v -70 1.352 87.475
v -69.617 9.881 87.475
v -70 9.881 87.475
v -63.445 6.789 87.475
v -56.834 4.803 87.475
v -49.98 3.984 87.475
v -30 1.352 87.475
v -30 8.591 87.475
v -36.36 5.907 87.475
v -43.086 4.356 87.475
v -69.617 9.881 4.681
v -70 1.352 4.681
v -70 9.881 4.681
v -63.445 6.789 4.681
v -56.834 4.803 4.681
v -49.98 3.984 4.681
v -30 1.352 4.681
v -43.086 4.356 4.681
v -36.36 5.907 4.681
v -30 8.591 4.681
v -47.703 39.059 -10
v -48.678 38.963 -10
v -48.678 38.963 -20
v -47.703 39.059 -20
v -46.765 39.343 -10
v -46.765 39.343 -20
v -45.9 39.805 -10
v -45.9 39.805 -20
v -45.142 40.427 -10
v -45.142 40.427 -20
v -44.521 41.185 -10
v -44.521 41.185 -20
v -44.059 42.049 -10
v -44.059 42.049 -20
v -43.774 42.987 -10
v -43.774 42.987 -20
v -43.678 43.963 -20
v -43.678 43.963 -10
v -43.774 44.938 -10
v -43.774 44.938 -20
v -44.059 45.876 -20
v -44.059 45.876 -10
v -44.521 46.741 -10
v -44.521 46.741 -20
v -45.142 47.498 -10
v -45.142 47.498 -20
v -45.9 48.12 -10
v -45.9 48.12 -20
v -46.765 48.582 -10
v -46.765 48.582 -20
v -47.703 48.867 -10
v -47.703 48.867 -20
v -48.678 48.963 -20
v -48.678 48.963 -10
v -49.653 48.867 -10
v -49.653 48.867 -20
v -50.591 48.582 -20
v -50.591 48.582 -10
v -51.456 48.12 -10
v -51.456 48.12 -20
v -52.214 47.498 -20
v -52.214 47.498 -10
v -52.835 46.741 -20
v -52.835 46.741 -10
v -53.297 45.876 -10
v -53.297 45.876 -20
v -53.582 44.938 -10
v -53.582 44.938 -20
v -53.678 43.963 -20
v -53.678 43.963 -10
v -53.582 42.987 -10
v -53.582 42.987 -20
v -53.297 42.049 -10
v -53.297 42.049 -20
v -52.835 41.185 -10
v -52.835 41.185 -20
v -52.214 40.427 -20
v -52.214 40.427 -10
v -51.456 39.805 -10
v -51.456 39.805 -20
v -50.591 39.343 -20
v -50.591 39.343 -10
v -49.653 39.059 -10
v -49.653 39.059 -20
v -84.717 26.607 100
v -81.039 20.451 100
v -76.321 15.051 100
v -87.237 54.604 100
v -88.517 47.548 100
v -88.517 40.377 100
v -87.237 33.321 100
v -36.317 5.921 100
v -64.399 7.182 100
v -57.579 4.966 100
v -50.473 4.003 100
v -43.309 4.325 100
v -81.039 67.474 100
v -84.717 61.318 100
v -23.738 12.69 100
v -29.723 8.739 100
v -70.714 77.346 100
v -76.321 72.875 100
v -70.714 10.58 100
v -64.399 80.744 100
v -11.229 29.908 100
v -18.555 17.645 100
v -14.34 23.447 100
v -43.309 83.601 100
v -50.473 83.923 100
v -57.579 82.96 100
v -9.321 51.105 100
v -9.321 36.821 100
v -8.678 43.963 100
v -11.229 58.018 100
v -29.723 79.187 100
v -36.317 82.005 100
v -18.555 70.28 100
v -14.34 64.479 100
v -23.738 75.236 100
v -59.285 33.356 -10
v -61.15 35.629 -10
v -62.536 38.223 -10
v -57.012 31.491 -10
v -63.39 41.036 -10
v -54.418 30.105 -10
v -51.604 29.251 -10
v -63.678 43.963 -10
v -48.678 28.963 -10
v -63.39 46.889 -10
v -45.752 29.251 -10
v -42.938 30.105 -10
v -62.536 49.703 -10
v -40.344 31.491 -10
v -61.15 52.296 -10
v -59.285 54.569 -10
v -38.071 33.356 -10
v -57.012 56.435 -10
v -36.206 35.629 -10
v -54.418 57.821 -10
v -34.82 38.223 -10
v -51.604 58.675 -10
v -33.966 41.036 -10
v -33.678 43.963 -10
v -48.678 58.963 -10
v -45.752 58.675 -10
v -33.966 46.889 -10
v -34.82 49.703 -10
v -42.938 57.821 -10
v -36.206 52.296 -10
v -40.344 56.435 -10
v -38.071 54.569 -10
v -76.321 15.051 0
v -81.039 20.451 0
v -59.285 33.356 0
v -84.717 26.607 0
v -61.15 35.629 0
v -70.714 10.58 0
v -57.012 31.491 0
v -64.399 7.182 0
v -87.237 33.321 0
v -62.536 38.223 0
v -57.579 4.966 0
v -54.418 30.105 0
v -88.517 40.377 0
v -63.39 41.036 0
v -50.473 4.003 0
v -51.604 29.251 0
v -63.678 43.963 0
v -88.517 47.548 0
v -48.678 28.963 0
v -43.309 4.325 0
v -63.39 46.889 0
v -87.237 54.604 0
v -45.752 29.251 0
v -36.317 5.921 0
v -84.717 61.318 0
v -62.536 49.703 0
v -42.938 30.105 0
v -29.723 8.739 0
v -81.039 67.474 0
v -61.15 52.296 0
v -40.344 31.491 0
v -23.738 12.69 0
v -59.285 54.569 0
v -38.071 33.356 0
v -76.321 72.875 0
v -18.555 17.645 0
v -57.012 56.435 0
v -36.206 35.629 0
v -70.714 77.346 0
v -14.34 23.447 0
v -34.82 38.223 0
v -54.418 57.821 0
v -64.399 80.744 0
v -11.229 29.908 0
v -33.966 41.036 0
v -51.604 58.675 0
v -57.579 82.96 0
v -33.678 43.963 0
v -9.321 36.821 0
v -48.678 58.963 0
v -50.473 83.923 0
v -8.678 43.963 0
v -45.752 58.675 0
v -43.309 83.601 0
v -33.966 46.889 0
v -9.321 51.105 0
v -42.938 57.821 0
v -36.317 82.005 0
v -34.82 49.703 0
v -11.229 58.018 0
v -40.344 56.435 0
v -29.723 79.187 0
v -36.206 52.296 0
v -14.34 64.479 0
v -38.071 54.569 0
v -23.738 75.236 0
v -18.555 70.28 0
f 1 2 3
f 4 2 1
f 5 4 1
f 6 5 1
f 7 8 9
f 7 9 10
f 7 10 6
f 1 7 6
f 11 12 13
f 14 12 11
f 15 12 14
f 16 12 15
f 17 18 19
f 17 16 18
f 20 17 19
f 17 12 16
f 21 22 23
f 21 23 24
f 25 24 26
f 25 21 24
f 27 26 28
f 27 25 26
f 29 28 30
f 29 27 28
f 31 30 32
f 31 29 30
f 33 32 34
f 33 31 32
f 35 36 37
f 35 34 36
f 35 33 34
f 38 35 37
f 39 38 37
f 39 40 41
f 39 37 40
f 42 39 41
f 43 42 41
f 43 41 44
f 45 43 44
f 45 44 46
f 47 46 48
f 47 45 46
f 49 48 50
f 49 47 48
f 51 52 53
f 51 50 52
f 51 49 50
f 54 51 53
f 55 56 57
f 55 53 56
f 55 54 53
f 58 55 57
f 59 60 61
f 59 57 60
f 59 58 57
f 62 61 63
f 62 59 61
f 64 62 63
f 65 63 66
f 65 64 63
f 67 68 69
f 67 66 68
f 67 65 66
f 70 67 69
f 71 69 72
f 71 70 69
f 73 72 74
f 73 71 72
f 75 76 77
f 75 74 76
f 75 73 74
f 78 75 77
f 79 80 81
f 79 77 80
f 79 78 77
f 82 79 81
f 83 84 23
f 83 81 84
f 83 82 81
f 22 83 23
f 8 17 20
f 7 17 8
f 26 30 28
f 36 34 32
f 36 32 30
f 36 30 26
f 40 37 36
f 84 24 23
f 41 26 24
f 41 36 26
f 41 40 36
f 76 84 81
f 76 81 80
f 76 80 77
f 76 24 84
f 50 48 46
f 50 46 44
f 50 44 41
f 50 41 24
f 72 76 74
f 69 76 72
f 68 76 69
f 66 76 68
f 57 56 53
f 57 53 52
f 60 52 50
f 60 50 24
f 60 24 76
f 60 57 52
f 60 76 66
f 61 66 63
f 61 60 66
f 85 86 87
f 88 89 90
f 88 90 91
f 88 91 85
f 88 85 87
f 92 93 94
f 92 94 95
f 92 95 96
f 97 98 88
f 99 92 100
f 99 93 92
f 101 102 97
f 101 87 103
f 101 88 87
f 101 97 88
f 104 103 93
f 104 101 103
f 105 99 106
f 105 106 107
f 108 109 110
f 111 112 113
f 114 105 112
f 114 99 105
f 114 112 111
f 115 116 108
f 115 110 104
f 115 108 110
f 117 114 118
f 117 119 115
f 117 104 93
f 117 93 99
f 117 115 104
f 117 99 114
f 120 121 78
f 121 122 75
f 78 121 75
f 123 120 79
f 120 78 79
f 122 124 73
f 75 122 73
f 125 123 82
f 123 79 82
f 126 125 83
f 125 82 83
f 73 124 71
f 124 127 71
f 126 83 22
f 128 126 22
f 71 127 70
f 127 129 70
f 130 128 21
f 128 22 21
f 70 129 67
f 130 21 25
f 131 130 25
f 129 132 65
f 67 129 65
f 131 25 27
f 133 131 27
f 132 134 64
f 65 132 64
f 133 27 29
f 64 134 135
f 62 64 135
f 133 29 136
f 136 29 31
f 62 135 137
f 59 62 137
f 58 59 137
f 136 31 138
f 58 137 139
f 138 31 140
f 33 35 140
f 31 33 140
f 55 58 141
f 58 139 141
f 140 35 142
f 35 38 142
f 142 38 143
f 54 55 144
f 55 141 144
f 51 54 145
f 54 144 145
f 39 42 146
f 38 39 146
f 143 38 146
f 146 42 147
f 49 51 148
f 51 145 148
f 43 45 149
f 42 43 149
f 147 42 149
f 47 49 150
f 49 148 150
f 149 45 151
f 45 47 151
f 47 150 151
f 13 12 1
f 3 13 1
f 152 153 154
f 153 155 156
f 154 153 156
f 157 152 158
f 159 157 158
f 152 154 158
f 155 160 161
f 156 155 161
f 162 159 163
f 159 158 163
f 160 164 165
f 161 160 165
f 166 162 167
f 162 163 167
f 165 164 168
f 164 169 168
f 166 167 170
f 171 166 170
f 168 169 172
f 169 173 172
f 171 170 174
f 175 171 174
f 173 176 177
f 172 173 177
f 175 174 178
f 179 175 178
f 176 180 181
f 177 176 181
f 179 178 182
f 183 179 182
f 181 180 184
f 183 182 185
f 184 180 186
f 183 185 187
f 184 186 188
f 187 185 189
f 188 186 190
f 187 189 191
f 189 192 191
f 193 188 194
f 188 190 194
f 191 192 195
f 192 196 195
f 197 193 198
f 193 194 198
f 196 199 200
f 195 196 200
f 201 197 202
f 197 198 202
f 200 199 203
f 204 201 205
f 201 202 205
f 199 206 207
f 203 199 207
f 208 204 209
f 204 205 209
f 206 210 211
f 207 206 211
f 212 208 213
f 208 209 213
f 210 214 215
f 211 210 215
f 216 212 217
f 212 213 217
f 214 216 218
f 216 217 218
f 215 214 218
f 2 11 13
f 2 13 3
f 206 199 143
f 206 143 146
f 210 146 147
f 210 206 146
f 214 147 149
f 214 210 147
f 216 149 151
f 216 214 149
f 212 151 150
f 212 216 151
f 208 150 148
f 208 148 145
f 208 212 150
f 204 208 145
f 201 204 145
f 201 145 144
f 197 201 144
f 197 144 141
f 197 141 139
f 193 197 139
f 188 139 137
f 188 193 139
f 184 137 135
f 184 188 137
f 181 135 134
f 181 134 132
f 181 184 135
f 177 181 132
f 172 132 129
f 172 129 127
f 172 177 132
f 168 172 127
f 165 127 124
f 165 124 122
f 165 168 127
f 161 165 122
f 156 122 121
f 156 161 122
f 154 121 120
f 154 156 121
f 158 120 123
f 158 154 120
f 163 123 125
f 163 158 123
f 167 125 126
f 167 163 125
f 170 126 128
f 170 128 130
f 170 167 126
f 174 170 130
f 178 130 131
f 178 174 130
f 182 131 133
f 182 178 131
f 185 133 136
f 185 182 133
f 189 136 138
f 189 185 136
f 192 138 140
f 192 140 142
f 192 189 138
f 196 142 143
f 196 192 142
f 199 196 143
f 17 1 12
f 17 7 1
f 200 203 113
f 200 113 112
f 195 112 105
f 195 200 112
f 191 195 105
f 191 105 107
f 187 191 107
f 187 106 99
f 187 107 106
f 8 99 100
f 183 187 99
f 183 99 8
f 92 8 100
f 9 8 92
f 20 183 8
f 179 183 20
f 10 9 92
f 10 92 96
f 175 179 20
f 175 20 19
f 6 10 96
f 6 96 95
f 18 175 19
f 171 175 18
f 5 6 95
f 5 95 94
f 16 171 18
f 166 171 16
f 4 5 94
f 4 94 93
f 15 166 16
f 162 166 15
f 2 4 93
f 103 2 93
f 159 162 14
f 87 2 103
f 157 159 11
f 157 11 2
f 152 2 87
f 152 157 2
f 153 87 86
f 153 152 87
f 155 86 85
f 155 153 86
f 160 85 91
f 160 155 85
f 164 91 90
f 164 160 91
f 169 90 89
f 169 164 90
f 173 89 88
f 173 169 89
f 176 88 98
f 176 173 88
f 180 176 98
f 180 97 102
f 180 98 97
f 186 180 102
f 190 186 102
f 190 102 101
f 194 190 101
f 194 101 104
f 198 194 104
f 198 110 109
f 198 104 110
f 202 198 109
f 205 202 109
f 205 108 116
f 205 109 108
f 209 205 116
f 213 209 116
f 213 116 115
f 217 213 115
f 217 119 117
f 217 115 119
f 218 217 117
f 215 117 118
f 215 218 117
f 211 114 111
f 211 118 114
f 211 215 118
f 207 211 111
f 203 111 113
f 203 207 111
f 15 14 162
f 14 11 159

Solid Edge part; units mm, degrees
sketch "Sketch1" plane through (0, 0, 0) normal (0, 0, 1) x (1, 0, 0)
  circle A0 centre (-48.678, 43.9628) radius 40
extrude "Protrusion1" add sketch "Sketch1" along normal blind 100
sketch "Sketch2" plane through (0, 0, 0) normal (0, 0, 1) x (1, 0, 0)
  circle A0 centre (-48.678, 43.9628) radius 15
extrude "ExtrudedProtrusion_3" add sketch "Sketch2" against normal blind 10
sketch "Sketch3" plane through (-48.678, 43.9628, -10) normal (0, 0, -1) x (0, -1, 0)
  circle A0 centre (0, 0) radius 5
extrude "ExtrudedProtrusion_4" add sketch "Sketch3" along normal blind 10
sketch "Sketch4" plane through (-30, 0, 0) normal (1, 0, 0) x (0, 1, 0)
  line L0 (1.3522, 87.4748) -> (1.3522, 4.6806)
  line L1 (1.3522, 4.6806) -> (9.8812, 4.6806)
  line L2 (9.8812, 4.6806) -> (9.8812, 87.4748)
  line L3 (9.8812, 87.4748) -> (1.3522, 87.4748)
extrude "ExtrudedProtrusion_6" add sketch "Sketch4" against normal blind 40
